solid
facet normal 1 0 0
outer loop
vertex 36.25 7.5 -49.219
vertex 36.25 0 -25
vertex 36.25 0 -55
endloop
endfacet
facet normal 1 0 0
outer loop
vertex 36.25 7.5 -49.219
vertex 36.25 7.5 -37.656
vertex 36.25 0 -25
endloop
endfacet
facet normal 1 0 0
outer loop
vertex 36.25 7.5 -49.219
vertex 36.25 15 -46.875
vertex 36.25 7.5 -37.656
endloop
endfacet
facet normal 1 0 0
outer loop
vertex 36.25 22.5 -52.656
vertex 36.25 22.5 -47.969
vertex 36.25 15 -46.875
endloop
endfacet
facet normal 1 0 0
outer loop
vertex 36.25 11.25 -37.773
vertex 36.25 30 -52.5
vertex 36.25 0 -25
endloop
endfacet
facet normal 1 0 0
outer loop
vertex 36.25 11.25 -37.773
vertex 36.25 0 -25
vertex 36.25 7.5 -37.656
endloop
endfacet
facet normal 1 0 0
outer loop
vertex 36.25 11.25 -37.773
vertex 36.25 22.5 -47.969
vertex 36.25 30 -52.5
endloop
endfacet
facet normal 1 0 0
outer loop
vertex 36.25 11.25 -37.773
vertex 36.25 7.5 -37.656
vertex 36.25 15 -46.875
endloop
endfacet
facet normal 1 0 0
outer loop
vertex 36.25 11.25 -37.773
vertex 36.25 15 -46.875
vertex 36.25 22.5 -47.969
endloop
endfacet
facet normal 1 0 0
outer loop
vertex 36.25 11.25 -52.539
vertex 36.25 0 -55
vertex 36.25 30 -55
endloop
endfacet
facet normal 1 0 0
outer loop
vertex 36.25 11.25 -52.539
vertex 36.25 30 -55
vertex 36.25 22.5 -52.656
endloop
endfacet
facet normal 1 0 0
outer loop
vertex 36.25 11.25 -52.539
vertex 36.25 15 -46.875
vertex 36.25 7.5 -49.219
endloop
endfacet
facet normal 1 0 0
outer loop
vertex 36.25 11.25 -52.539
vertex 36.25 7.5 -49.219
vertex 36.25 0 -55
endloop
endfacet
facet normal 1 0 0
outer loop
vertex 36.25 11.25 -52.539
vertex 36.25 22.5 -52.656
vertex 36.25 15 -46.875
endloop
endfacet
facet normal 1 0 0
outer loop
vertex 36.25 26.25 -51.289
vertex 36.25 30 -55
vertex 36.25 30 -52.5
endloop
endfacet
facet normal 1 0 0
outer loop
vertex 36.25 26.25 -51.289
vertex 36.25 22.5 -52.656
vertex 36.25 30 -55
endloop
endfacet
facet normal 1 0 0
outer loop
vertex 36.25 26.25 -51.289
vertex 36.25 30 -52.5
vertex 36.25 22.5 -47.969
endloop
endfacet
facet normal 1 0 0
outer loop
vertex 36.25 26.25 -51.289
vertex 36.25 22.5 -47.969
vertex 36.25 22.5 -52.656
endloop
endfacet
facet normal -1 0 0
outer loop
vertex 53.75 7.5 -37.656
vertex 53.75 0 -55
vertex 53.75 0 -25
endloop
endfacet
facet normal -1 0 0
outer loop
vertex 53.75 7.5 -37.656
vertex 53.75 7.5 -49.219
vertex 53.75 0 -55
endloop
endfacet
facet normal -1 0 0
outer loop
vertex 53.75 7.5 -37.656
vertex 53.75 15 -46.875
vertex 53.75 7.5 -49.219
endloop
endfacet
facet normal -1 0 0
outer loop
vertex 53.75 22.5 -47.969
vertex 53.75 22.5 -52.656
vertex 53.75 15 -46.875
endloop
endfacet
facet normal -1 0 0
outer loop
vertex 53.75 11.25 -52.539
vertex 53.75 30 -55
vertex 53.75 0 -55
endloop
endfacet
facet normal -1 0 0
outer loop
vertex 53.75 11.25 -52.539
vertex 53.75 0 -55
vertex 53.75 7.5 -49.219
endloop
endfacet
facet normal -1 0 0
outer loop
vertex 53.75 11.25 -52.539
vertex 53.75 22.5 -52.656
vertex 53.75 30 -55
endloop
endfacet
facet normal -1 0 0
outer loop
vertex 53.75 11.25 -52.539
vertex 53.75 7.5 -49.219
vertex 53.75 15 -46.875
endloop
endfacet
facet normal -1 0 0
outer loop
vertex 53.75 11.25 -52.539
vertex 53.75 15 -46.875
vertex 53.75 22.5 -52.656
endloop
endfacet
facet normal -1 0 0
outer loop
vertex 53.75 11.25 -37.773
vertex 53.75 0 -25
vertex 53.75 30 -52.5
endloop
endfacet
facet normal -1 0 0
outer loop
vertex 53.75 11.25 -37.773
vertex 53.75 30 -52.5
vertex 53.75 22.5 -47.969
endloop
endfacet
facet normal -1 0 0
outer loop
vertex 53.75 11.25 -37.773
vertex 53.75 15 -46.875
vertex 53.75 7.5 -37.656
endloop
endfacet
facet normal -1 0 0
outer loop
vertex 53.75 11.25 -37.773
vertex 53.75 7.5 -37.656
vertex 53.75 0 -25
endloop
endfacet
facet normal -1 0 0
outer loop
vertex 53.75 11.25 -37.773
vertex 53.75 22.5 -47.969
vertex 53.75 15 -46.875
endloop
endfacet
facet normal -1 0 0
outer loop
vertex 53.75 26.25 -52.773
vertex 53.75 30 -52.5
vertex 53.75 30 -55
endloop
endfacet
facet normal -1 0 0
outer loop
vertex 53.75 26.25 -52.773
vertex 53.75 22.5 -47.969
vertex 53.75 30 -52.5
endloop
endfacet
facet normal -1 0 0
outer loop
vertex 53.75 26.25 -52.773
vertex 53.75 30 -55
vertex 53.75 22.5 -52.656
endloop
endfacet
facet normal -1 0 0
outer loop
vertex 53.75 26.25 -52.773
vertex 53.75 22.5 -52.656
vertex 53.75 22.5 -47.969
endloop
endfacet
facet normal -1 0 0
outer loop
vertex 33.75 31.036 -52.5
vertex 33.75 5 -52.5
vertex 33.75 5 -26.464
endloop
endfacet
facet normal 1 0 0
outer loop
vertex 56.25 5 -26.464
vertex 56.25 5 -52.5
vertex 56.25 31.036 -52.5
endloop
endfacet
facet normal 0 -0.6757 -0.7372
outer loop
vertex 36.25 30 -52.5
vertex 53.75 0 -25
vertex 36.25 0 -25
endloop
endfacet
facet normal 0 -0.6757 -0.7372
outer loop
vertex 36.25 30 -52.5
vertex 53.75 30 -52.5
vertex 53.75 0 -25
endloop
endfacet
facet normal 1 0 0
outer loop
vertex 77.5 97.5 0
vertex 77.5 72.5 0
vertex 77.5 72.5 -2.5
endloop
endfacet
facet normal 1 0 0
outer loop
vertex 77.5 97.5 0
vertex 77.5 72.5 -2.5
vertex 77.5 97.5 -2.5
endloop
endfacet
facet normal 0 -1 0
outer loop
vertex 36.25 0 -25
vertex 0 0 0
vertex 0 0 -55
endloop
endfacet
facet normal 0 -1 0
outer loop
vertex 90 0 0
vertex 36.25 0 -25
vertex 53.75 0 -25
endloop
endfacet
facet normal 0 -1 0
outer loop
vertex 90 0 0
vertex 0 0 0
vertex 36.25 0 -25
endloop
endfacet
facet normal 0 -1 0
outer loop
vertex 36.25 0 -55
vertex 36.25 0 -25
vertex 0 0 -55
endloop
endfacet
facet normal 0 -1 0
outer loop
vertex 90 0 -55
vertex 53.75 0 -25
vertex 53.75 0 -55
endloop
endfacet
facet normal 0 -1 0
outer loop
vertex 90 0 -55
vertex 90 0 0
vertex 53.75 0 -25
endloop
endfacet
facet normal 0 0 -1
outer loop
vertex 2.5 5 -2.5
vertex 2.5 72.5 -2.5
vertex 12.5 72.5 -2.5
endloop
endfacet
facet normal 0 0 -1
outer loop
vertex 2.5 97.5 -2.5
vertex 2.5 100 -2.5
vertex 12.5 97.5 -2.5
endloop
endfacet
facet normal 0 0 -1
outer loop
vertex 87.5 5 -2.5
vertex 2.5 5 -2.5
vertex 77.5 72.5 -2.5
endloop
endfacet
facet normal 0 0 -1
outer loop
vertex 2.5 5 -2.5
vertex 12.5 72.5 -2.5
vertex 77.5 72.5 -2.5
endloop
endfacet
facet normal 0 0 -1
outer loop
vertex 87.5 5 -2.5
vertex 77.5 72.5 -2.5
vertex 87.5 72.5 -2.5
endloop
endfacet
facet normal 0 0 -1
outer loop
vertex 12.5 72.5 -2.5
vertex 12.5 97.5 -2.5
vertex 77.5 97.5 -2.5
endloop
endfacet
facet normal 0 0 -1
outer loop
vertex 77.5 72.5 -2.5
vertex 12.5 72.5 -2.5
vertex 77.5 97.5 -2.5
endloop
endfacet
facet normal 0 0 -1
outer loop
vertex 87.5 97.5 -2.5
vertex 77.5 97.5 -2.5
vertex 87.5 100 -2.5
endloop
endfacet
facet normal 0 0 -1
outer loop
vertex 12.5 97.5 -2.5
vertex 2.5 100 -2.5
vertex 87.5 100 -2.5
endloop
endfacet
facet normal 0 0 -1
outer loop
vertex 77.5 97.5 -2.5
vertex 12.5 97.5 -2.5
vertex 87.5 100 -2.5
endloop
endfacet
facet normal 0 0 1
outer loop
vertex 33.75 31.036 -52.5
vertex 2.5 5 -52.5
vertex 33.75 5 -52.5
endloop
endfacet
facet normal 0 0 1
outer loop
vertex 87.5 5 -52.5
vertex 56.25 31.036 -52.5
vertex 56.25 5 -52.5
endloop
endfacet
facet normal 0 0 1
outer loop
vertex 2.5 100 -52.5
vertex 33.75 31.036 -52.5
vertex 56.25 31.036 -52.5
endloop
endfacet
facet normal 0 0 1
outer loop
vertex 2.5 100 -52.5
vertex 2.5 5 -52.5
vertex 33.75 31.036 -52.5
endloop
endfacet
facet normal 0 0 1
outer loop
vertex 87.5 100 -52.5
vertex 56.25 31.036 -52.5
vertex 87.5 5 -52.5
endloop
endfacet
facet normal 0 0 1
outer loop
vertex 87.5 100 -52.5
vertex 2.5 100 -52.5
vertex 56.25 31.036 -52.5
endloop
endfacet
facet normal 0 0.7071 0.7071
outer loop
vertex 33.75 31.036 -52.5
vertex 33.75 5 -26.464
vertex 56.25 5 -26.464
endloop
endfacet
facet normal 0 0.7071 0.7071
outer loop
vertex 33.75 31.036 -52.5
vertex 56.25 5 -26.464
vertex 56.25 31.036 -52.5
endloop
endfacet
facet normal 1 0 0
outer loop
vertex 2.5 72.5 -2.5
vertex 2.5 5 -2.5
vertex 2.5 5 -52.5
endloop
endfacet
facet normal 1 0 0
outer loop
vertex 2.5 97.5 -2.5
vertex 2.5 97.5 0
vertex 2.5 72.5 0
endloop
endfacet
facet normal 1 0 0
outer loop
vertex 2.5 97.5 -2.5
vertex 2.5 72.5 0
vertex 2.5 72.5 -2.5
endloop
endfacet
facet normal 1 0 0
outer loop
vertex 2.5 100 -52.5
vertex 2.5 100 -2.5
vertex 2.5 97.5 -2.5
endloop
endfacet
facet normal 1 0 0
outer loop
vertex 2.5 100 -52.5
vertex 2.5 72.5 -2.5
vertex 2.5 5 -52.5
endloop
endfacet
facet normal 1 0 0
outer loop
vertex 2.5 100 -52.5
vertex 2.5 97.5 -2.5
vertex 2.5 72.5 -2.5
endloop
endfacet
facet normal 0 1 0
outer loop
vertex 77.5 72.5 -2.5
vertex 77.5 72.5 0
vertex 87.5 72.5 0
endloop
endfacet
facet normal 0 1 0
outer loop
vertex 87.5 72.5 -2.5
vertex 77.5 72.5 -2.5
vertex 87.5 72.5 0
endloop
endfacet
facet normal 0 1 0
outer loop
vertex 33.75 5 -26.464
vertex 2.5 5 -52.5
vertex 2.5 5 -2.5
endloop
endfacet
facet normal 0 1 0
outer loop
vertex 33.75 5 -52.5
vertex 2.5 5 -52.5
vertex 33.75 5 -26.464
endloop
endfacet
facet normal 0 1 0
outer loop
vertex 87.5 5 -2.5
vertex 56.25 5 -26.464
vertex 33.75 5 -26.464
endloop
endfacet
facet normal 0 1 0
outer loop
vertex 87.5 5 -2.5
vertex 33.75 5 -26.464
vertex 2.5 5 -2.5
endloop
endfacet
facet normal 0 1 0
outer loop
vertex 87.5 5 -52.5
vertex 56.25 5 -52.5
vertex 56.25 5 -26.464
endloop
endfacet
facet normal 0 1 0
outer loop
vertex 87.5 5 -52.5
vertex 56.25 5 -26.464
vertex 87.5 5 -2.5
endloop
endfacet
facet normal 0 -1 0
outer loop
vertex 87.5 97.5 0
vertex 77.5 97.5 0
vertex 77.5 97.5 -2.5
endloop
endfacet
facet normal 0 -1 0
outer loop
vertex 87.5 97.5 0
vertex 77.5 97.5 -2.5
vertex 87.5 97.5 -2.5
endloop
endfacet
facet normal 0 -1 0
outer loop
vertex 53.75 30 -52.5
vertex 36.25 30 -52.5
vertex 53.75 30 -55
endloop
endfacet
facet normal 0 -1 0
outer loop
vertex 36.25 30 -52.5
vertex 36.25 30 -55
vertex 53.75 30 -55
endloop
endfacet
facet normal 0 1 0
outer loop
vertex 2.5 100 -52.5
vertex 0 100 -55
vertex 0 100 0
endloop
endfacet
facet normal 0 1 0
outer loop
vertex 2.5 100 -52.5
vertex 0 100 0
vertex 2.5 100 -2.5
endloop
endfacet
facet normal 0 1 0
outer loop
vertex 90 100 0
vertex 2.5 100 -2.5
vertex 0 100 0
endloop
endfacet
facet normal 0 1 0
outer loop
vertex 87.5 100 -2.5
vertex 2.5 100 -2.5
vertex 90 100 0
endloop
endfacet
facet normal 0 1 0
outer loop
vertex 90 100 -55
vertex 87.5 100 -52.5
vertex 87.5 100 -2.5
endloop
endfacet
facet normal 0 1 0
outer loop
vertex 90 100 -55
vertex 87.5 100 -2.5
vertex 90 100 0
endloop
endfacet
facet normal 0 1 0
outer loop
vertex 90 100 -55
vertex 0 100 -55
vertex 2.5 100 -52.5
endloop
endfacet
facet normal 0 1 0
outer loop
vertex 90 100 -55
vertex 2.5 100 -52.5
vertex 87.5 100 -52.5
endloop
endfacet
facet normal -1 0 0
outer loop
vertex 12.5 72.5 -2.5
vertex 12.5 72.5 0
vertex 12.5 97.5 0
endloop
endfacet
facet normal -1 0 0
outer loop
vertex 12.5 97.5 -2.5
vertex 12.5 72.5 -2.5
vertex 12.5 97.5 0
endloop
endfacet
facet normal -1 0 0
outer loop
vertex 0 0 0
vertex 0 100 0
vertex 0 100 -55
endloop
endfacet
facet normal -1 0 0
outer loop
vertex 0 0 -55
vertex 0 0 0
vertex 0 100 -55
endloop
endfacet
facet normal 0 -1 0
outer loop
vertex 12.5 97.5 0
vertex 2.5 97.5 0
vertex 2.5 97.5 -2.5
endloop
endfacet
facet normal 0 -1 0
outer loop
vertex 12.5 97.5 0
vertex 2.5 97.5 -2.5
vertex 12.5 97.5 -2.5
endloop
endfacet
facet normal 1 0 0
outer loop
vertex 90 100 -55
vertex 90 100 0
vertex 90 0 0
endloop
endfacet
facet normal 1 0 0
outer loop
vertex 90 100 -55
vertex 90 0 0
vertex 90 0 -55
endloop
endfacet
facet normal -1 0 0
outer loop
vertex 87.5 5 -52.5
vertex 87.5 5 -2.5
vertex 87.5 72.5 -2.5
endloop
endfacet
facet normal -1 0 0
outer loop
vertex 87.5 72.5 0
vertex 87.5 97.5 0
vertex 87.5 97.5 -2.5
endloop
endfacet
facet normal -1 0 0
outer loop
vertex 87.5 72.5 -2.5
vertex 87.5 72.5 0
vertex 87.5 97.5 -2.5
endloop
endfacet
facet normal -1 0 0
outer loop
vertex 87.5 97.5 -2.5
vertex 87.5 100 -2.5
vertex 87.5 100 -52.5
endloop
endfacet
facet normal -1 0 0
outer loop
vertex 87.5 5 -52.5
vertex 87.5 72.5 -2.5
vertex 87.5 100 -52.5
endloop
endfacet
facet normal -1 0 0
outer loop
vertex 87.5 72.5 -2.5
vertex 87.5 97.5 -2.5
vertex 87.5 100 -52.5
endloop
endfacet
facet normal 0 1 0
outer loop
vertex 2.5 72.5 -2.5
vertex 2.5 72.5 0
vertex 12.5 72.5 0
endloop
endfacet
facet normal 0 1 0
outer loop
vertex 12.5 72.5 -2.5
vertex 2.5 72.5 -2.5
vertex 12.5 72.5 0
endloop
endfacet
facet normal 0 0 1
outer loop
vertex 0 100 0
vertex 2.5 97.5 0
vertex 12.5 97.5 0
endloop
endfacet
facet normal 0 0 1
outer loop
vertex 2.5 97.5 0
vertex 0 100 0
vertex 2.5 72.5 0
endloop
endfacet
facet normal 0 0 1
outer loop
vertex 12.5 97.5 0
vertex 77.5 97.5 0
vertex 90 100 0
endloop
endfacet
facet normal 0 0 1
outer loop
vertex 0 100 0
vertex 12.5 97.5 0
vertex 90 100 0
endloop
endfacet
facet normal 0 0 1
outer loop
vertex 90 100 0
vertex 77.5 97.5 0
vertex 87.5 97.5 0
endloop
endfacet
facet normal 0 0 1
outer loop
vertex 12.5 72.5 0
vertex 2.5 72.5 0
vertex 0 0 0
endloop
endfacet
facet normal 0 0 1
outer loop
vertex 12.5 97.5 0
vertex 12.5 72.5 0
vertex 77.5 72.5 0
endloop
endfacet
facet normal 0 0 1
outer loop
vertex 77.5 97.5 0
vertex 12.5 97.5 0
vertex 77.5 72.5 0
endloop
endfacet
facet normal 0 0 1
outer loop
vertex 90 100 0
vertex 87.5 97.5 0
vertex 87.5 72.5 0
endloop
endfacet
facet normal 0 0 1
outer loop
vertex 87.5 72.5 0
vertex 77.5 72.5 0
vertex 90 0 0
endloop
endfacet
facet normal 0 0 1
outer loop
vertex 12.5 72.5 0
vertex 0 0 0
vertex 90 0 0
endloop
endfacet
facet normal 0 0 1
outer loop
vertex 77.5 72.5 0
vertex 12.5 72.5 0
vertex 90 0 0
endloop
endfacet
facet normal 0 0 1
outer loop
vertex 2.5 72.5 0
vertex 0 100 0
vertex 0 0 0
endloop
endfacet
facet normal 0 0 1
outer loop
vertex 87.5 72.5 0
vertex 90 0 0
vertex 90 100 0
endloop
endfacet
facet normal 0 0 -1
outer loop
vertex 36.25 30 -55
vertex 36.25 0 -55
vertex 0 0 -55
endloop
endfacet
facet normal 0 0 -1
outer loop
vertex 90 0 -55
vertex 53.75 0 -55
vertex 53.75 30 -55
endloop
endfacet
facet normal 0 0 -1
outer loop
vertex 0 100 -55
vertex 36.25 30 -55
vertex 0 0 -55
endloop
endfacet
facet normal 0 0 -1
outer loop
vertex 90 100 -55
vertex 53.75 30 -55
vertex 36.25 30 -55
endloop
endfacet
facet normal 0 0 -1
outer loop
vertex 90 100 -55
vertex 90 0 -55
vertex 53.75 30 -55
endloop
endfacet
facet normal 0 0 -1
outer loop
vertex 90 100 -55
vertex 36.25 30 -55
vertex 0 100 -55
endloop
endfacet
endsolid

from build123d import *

# Parameters (mm, degrees)
SKETCH2_W                = 90
SKETCH2_H                = 55
BOSS_EXTRUDE1_DEPTH      = 100
SKETCH3_W                = 85
SKETCH3_H                = 50
CUT_EXTRUDE1_DEPTH       = 95
BOSS_EXTRUDE4_DEPTH      = 20
BOSS_EXTRUDE4_DEPTH_BACK = 2.5
SKETCH4_W                = 17.5
SKETCH4_H                = 30
SKETCH7_W                = 17.5
SKETCH7_H                = 2.5
CUT_EXTRUDE2_REACH       = 57
SKETCH11_W               = 10
SKETCH11_H               = 25


with BuildPart() as part:
    # Sketch2 → Boss-Extrude1 (new body)
    with BuildSketch(Plane(origin=(0, 0, 0), x_dir=(1, 0, 0), z_dir=(0, 1, 0))):
        with Locations((45, 27.5)):
            Rectangle(SKETCH2_W, SKETCH2_H)
    extrude(amount=BOSS_EXTRUDE1_DEPTH)

    # Sketch3 → Cut-Extrude1 (cut)
    with BuildSketch(Plane(origin=(0, 100, 0), x_dir=(1, 0, 0), z_dir=(0, 1, 0))):
        with Locations((45, 27.5)):
            Rectangle(SKETCH3_W, SKETCH3_H)
    extrude(amount=-CUT_EXTRUDE1_DEPTH, mode=Mode.SUBTRACT)

    # Sketch10 → Boss-Extrude4 (add, two sides)
    with BuildSketch(Plane(origin=(36.25, 0, 0), x_dir=(0, 0, -1), z_dir=(1, 0, 0))) as boss_extrude4_sk:
        Polygon((55, 30), (55, 0), (25, 0), (21.464466094, 0), (55, 33.535533906), align=None)
    extrude(amount=BOSS_EXTRUDE4_DEPTH)
    extrude(boss_extrude4_sk.sketch, amount=-BOSS_EXTRUDE4_DEPTH_BACK)

    # Sketch4 → Cut-Loft4 section 0
    with BuildSketch(Plane.XZ):
        with Locations((45, -40)):
            Rectangle(SKETCH4_W, SKETCH4_H)
    # Sketch7 → Cut-Loft4 section 1
    with BuildSketch(Plane(origin=(0, 30, 0), x_dir=(-1, 0, 0), z_dir=(0, -1, 0))):
        with Locations((-45, 53.75)):
            Rectangle(SKETCH7_W, SKETCH7_H)
    loft(mode=Mode.SUBTRACT)

    # Sketch11 → Cut-Extrude2 (cut, up to next)
    with BuildSketch(Plane.XY, mode=Mode.PRIVATE) as cut_extrude2_sk1:
        with Locations((82.5, 85)):
            Rectangle(SKETCH11_W, SKETCH11_H)
    cut_extrude2_tool1 = extrude(cut_extrude2_sk1.sketch, amount=-CUT_EXTRUDE2_REACH, mode=Mode.PRIVATE) & part.part
    add(cut_extrude2_tool1.solids().sort_by_distance((82.5, 85, 0))[0], mode=Mode.SUBTRACT)
    # Sketch11 → Cut-Extrude2 (cut, up to next)
    with BuildSketch(Plane.XY, mode=Mode.PRIVATE) as cut_extrude2_sk2:
        with Locations((7.5, 85)):
            Rectangle(SKETCH11_W, SKETCH11_H)
    cut_extrude2_tool2 = extrude(cut_extrude2_sk2.sketch, amount=-CUT_EXTRUDE2_REACH, mode=Mode.PRIVATE) & part.part
    add(cut_extrude2_tool2.solids().sort_by_distance((7.5, 85, 0))[0], mode=Mode.SUBTRACT)


solid = part.part
